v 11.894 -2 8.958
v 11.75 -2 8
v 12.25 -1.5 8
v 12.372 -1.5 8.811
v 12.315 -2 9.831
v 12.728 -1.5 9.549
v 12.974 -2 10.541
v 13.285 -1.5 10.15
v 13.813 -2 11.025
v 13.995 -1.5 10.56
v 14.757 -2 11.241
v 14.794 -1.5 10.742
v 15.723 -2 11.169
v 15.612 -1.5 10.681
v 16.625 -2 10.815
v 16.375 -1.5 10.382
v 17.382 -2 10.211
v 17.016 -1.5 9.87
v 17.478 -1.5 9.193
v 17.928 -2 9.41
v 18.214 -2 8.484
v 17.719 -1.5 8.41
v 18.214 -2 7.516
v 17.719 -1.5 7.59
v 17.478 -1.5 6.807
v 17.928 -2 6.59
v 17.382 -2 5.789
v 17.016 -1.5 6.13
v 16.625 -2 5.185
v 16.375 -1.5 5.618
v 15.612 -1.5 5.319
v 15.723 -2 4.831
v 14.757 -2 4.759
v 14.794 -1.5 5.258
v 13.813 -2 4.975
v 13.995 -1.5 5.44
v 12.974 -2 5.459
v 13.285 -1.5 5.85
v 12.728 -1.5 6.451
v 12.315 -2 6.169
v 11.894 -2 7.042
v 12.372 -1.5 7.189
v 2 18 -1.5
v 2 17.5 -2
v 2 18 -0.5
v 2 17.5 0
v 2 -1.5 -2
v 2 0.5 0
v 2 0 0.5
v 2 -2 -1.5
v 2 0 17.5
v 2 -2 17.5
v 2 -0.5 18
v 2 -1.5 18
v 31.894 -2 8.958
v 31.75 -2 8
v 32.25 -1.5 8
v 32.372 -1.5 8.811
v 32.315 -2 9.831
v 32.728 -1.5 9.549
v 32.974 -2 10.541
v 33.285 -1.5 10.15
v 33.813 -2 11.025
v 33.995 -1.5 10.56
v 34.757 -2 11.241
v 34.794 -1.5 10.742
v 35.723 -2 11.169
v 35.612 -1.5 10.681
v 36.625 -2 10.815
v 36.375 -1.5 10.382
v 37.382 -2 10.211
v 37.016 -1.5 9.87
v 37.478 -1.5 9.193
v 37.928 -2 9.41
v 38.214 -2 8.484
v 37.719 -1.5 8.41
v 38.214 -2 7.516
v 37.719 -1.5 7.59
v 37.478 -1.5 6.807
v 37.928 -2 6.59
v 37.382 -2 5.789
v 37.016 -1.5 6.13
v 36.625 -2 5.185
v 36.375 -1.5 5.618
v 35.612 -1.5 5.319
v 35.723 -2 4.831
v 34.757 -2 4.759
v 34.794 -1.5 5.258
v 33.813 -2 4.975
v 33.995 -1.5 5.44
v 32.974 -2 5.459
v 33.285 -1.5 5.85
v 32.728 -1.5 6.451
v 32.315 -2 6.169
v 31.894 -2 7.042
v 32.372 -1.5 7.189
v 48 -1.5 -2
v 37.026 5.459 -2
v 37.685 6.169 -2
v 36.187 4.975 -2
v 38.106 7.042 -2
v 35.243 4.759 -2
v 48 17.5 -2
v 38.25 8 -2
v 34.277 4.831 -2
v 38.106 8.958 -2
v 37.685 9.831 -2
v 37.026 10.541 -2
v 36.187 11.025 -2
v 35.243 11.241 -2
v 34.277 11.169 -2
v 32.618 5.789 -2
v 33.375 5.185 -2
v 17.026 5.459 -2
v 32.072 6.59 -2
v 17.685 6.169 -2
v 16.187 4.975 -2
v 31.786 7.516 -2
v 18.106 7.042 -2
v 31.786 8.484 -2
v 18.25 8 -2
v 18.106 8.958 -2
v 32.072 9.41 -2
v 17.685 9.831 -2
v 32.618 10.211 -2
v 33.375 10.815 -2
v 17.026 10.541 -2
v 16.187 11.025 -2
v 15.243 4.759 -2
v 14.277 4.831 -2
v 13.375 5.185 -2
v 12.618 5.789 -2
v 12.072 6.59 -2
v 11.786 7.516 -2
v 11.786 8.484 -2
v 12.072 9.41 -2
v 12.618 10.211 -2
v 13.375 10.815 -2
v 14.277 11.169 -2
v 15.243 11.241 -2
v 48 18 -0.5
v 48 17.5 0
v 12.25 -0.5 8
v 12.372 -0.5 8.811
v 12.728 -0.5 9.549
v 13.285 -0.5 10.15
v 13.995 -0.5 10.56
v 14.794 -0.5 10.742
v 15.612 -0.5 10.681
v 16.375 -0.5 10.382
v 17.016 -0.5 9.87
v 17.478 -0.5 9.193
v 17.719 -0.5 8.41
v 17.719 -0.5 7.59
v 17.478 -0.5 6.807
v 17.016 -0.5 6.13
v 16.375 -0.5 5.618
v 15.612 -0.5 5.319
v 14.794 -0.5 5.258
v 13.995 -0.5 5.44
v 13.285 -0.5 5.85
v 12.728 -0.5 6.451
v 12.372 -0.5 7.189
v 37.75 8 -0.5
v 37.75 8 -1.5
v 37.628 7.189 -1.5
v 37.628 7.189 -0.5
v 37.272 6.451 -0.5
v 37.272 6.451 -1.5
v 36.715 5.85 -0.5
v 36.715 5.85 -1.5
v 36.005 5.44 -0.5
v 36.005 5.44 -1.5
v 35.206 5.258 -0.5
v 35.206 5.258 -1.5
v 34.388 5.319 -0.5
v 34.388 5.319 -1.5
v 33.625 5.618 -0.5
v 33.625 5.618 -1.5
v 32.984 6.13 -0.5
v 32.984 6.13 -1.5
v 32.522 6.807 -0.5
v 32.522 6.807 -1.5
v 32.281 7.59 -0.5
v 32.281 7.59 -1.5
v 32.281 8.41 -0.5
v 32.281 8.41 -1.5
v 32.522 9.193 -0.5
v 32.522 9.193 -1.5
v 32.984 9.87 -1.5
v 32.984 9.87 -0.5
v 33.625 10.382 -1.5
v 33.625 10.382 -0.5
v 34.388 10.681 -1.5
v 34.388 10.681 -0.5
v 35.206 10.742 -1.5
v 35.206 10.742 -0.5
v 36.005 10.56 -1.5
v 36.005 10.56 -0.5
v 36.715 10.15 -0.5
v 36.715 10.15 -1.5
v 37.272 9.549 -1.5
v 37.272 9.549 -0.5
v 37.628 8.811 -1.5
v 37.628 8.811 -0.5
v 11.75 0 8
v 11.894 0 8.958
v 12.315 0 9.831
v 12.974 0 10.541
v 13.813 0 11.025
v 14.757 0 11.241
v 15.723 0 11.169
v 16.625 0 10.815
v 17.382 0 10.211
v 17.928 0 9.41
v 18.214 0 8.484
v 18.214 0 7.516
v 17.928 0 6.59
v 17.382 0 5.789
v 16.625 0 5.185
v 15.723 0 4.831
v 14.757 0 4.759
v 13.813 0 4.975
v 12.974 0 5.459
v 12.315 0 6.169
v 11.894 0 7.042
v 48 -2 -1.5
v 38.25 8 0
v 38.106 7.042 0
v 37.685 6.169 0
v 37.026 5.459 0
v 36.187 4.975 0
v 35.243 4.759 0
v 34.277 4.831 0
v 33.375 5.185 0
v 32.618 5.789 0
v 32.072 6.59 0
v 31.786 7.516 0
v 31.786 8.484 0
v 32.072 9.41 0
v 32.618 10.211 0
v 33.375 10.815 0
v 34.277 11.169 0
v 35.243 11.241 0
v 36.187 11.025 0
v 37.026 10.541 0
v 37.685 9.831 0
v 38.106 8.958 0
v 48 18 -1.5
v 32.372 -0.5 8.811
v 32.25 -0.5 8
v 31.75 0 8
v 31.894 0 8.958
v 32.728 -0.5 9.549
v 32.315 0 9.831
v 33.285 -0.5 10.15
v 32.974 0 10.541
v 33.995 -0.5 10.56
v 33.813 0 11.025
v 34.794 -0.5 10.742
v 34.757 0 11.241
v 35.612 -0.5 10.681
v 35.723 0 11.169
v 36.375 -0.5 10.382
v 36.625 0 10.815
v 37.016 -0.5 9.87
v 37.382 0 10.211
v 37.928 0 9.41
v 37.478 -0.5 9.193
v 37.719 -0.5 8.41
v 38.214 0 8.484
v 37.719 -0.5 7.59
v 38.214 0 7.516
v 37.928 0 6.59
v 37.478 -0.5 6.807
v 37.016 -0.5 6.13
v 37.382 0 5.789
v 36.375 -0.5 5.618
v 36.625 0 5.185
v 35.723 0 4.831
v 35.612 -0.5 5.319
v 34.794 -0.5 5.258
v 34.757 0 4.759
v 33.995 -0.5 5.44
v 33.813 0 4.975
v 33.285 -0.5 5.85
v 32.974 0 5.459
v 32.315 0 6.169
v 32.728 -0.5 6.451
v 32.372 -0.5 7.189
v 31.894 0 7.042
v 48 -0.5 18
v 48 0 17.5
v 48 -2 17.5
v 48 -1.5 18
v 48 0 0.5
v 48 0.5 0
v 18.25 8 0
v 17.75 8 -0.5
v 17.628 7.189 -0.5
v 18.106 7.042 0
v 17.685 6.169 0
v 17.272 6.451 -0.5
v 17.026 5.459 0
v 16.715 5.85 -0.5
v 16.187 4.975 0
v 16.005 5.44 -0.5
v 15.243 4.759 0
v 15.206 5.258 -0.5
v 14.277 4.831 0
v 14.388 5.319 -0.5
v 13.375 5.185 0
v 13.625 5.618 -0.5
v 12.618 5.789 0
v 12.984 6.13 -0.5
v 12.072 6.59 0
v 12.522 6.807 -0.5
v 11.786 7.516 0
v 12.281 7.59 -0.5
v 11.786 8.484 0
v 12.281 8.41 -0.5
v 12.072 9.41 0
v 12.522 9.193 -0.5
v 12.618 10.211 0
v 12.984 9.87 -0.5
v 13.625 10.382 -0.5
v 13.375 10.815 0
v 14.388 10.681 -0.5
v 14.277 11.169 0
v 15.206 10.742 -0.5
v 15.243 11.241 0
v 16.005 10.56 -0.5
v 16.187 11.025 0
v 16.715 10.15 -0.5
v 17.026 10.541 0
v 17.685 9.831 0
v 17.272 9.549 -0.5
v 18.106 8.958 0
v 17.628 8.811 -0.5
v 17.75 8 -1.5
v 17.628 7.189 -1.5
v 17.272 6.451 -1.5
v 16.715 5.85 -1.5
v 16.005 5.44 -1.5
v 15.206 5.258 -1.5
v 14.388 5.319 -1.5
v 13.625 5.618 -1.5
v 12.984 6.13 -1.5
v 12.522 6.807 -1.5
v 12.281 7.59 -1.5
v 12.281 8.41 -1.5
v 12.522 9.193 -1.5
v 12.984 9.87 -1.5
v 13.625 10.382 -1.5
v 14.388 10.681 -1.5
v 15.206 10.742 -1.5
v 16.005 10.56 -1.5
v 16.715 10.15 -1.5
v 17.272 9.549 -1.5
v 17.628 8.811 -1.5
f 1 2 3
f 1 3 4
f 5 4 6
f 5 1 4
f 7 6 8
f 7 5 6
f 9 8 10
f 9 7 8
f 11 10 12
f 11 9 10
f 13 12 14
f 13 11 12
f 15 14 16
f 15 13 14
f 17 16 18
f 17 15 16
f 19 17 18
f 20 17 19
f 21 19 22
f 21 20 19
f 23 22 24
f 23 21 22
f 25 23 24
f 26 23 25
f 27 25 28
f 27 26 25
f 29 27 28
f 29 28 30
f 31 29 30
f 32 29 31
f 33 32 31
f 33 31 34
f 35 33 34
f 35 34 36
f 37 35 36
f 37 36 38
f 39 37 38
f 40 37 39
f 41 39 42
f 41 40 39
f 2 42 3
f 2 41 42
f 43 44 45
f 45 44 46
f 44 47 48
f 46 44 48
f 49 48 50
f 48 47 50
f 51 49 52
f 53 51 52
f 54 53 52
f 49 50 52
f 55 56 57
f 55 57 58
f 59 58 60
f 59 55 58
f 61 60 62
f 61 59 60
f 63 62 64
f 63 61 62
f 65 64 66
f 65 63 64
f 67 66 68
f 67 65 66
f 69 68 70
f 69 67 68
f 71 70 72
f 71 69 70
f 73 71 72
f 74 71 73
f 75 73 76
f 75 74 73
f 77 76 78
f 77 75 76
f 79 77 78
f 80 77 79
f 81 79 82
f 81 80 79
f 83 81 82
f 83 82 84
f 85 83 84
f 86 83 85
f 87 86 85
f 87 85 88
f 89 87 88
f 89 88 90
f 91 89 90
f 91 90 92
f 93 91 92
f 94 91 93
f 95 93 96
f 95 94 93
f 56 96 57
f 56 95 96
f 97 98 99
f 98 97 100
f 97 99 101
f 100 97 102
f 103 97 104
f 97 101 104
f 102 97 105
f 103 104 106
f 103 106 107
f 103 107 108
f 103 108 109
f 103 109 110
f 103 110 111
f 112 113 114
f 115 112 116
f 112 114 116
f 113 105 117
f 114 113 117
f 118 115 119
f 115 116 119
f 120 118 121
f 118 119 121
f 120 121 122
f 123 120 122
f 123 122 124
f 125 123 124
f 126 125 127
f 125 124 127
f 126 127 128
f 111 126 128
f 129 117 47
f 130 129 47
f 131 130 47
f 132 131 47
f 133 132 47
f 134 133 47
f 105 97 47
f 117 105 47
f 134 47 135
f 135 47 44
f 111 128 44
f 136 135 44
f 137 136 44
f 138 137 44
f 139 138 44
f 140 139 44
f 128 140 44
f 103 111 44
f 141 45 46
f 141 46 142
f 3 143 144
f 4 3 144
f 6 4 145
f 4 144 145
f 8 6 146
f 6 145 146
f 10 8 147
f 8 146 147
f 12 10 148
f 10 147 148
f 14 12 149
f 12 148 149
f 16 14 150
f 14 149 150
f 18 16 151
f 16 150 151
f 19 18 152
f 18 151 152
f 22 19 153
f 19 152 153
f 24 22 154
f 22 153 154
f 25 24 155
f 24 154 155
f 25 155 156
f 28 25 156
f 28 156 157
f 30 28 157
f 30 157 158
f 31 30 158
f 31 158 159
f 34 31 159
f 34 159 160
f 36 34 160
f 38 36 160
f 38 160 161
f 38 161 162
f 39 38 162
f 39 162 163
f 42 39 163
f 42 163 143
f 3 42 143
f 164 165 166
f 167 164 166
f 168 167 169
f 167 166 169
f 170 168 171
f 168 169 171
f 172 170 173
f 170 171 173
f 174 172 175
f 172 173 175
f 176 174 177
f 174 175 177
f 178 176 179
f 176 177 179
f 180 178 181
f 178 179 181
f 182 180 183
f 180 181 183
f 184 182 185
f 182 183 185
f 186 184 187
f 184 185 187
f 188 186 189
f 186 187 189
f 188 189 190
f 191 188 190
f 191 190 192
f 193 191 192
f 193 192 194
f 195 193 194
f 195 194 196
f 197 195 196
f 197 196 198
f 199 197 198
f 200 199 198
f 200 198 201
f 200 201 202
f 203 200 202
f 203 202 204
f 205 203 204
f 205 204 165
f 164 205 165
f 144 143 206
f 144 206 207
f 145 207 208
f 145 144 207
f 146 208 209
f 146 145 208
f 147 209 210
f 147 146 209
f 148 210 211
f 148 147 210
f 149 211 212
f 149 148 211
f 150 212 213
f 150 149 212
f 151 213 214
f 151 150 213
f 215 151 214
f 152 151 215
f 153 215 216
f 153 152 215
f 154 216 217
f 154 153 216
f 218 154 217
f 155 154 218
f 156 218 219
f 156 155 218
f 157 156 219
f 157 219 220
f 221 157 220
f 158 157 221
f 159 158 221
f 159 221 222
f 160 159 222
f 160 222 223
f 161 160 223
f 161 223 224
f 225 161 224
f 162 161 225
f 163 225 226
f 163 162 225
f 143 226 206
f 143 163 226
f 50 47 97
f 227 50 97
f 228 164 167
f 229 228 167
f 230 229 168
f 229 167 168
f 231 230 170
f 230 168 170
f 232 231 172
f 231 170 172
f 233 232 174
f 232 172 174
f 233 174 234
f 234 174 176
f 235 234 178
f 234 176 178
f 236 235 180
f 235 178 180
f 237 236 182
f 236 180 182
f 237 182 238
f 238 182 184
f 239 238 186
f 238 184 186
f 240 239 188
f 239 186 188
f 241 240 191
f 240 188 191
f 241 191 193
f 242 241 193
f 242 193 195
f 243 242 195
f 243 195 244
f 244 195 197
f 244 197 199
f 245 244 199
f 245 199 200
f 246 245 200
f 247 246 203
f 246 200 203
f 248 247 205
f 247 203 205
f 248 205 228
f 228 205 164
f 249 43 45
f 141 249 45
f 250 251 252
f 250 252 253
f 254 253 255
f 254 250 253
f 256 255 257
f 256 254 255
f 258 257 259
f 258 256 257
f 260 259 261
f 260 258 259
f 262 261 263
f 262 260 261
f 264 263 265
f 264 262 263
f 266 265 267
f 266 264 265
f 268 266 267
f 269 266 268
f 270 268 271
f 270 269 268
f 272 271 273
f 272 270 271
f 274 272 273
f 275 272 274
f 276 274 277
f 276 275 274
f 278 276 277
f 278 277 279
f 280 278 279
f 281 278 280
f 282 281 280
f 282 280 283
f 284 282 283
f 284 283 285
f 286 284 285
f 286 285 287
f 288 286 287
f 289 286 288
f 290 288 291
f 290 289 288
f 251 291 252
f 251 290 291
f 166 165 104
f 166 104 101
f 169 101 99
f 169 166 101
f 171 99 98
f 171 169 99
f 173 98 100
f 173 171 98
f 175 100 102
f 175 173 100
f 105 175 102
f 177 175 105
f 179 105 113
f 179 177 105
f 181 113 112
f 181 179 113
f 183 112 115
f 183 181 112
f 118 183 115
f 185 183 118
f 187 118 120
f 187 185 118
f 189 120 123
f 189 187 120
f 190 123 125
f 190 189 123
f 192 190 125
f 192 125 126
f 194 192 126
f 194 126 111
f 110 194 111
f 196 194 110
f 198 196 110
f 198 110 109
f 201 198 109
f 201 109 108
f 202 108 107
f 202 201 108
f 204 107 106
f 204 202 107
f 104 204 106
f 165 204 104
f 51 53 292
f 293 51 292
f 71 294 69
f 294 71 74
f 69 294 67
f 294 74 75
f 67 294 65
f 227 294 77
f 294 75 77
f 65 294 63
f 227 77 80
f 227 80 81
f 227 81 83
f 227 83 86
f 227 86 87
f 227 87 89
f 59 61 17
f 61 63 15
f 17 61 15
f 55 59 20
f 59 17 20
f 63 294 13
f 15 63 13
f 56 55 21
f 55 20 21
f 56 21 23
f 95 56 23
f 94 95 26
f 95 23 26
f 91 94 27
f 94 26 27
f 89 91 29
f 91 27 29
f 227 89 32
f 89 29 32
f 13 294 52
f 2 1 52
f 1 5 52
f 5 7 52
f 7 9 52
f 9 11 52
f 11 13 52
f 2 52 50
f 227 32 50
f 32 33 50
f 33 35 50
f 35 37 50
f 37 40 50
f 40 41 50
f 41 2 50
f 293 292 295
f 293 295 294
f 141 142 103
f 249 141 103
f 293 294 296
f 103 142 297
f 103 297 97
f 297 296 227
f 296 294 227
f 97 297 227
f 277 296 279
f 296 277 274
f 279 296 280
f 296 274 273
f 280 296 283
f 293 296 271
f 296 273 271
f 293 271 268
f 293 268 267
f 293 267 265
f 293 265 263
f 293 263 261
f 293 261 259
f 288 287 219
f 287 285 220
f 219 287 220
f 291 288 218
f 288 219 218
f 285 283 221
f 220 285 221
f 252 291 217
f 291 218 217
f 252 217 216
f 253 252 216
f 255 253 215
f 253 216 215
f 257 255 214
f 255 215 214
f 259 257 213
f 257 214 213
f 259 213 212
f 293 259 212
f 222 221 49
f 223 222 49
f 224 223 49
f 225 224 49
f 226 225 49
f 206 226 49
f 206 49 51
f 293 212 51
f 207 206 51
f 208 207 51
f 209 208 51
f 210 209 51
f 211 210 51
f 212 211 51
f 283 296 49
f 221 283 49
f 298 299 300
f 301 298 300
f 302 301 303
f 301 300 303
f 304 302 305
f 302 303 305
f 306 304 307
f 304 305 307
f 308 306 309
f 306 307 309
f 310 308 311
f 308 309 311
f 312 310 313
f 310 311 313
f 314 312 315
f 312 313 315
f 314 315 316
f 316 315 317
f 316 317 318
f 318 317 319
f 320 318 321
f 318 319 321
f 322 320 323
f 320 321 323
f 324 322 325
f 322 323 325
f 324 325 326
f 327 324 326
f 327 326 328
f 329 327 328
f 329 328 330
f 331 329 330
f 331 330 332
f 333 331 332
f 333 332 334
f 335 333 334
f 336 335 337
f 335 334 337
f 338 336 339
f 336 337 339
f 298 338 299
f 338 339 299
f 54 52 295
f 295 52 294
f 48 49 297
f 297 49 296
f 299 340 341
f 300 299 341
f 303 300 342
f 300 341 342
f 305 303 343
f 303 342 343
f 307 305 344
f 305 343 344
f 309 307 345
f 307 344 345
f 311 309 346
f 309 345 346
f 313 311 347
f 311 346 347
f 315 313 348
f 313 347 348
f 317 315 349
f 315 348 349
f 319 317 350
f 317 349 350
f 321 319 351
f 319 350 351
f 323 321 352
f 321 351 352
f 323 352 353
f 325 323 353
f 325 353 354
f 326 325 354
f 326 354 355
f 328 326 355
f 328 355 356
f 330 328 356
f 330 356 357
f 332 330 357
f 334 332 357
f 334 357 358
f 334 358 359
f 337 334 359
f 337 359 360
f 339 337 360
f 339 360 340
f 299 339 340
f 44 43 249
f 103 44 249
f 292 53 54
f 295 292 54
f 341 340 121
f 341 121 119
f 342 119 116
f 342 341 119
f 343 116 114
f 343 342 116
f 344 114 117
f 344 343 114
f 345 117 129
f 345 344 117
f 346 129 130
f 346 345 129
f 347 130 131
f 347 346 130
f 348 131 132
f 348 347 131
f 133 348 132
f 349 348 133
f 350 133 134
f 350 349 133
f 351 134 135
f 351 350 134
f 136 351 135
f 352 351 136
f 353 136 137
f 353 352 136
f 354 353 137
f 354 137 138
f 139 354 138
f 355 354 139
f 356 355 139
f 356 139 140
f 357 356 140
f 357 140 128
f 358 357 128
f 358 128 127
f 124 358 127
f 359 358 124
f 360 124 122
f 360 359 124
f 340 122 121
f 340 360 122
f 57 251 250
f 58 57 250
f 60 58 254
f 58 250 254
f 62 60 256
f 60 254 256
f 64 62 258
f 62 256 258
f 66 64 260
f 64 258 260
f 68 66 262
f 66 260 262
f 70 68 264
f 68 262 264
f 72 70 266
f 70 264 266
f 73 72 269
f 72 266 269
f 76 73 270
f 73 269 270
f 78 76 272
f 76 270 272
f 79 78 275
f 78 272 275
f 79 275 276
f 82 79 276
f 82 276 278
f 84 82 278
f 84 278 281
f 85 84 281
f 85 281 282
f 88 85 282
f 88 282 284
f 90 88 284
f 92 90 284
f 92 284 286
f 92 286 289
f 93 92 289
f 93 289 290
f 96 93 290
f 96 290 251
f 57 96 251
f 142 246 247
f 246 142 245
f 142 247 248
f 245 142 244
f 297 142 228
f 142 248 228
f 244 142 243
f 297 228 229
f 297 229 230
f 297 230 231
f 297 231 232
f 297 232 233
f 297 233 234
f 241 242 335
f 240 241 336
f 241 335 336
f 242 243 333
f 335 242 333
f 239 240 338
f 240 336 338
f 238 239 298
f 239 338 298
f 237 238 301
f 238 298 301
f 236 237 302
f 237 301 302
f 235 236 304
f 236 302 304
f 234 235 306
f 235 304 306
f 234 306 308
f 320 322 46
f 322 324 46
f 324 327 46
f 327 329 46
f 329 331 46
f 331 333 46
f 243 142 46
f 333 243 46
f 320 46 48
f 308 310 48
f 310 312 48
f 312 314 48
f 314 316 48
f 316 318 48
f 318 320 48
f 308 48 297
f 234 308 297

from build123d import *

# Parameters (mm, degrees)
F1_DEPTH  = 50
F2_SIZE   = 0.5
F3_R      = 2.75
F4_DEPTH  = 25
F5_SIZE   = 0.5
F6_R      = 2.75
F7_DEPTH  = 25
F8_SIZE   = 0.5
F9_W      = 1.5
F9_H      = 19
F10_DEPTH = 25


with BuildPart() as f1:
    # F0 (on Right) → F1 (new body)
    with BuildSketch(Plane.YZ):
        Polygon((18, 0), (0, 0), (0, 18), (-2, 18), (-2, -2), (18, -2), align=None)
    extrude(amount=F1_DEPTH)

    # F2
    f2_edges = [f1.edges().sort_by_distance(p)[0] for p in [
        (25, 0, 18),
        (25, -2, 18),
        (0, -1, 18),
        (50, -1, 18),
        (25, 18, 0),
        (25, 0, 0),
        (0, 9, 0),
        (50, 9, 0),
        (25, -2, -2),
        (25, 18, -2),
        (0, 8, -2),
        (50, 8, -2),
        (0, -2, 8),
        (50, -2, 8),
    ]]
    chamfer(f2_edges, length=F2_SIZE)

    # F3 (on face) → F4 (cut)
    with BuildSketch(Plane(origin=(0, 0, 0), x_dir=(-1, 0, 0), z_dir=(0, 1, 0))):
        with Locations((-15, 8)):
            Circle(F3_R)
        with Locations((-35, 8)):
            Circle(F3_R)
    extrude(amount=-F4_DEPTH, mode=Mode.SUBTRACT)

    # F5
    f5_edges = [f1.edges().sort_by_distance(p)[0] for p in [
        (17.75, 0, 8),
        (12.25, -1, 8),
        (17.75, -2, 8),
        (37.75, 0, 8),
        (32.25, -1, 8),
        (37.75, -2, 8),
    ]]
    chamfer(f5_edges, length=F5_SIZE)

    # F6 (on face) → F7 (cut)
    with BuildSketch(Plane(origin=(0, 0, -2), x_dir=(1, 0, 0), z_dir=(0, 0, -1))):
        with Locations((15, -8)):
            Circle(F6_R)
        with Locations((35, -8)):
            Circle(F6_R)
    extrude(amount=-F7_DEPTH, mode=Mode.SUBTRACT)

    # F8
    f8_edges = [f1.edges().sort_by_distance(p)[0] for p in [
        (12.25, 8, -2),
        (17.75, 8, -1),
        (12.25, 8, 0),
        (32.25, 8, -2),
        (37.75, 8, -1),
        (32.25, 8, 0),
    ]]
    chamfer(f8_edges, length=F8_SIZE)

    # F9 (on face) → F10 (cut)
    with BuildSketch(Plane.XZ.offset(2)):
        Polygon((51.7472885549, 18), (48, 18), (48, 17.5), (49.5, 17.5), (49.5, -1.5), (48, -1.5), (48, -2), (48, -2.0400607027), (51.7472885549, -2.0400607027), align=None)
        with Locations((48.75, 8)):
            Rectangle(F9_W, F9_H)
        Polygon((2, 17.5), (2, 18), (2, 19.6672808379), (-2.285732422, 19.6672808379), (-2.285732422, -2), (2, -2), (2, -1.5), (0.5, -1.5), (0.5, 17.5), align=None)
        with Locations((1.25, 8)):
            Rectangle(F9_W, F9_H)
    extrude(amount=-F10_DEPTH, mode=Mode.SUBTRACT)


solid = f1.part
